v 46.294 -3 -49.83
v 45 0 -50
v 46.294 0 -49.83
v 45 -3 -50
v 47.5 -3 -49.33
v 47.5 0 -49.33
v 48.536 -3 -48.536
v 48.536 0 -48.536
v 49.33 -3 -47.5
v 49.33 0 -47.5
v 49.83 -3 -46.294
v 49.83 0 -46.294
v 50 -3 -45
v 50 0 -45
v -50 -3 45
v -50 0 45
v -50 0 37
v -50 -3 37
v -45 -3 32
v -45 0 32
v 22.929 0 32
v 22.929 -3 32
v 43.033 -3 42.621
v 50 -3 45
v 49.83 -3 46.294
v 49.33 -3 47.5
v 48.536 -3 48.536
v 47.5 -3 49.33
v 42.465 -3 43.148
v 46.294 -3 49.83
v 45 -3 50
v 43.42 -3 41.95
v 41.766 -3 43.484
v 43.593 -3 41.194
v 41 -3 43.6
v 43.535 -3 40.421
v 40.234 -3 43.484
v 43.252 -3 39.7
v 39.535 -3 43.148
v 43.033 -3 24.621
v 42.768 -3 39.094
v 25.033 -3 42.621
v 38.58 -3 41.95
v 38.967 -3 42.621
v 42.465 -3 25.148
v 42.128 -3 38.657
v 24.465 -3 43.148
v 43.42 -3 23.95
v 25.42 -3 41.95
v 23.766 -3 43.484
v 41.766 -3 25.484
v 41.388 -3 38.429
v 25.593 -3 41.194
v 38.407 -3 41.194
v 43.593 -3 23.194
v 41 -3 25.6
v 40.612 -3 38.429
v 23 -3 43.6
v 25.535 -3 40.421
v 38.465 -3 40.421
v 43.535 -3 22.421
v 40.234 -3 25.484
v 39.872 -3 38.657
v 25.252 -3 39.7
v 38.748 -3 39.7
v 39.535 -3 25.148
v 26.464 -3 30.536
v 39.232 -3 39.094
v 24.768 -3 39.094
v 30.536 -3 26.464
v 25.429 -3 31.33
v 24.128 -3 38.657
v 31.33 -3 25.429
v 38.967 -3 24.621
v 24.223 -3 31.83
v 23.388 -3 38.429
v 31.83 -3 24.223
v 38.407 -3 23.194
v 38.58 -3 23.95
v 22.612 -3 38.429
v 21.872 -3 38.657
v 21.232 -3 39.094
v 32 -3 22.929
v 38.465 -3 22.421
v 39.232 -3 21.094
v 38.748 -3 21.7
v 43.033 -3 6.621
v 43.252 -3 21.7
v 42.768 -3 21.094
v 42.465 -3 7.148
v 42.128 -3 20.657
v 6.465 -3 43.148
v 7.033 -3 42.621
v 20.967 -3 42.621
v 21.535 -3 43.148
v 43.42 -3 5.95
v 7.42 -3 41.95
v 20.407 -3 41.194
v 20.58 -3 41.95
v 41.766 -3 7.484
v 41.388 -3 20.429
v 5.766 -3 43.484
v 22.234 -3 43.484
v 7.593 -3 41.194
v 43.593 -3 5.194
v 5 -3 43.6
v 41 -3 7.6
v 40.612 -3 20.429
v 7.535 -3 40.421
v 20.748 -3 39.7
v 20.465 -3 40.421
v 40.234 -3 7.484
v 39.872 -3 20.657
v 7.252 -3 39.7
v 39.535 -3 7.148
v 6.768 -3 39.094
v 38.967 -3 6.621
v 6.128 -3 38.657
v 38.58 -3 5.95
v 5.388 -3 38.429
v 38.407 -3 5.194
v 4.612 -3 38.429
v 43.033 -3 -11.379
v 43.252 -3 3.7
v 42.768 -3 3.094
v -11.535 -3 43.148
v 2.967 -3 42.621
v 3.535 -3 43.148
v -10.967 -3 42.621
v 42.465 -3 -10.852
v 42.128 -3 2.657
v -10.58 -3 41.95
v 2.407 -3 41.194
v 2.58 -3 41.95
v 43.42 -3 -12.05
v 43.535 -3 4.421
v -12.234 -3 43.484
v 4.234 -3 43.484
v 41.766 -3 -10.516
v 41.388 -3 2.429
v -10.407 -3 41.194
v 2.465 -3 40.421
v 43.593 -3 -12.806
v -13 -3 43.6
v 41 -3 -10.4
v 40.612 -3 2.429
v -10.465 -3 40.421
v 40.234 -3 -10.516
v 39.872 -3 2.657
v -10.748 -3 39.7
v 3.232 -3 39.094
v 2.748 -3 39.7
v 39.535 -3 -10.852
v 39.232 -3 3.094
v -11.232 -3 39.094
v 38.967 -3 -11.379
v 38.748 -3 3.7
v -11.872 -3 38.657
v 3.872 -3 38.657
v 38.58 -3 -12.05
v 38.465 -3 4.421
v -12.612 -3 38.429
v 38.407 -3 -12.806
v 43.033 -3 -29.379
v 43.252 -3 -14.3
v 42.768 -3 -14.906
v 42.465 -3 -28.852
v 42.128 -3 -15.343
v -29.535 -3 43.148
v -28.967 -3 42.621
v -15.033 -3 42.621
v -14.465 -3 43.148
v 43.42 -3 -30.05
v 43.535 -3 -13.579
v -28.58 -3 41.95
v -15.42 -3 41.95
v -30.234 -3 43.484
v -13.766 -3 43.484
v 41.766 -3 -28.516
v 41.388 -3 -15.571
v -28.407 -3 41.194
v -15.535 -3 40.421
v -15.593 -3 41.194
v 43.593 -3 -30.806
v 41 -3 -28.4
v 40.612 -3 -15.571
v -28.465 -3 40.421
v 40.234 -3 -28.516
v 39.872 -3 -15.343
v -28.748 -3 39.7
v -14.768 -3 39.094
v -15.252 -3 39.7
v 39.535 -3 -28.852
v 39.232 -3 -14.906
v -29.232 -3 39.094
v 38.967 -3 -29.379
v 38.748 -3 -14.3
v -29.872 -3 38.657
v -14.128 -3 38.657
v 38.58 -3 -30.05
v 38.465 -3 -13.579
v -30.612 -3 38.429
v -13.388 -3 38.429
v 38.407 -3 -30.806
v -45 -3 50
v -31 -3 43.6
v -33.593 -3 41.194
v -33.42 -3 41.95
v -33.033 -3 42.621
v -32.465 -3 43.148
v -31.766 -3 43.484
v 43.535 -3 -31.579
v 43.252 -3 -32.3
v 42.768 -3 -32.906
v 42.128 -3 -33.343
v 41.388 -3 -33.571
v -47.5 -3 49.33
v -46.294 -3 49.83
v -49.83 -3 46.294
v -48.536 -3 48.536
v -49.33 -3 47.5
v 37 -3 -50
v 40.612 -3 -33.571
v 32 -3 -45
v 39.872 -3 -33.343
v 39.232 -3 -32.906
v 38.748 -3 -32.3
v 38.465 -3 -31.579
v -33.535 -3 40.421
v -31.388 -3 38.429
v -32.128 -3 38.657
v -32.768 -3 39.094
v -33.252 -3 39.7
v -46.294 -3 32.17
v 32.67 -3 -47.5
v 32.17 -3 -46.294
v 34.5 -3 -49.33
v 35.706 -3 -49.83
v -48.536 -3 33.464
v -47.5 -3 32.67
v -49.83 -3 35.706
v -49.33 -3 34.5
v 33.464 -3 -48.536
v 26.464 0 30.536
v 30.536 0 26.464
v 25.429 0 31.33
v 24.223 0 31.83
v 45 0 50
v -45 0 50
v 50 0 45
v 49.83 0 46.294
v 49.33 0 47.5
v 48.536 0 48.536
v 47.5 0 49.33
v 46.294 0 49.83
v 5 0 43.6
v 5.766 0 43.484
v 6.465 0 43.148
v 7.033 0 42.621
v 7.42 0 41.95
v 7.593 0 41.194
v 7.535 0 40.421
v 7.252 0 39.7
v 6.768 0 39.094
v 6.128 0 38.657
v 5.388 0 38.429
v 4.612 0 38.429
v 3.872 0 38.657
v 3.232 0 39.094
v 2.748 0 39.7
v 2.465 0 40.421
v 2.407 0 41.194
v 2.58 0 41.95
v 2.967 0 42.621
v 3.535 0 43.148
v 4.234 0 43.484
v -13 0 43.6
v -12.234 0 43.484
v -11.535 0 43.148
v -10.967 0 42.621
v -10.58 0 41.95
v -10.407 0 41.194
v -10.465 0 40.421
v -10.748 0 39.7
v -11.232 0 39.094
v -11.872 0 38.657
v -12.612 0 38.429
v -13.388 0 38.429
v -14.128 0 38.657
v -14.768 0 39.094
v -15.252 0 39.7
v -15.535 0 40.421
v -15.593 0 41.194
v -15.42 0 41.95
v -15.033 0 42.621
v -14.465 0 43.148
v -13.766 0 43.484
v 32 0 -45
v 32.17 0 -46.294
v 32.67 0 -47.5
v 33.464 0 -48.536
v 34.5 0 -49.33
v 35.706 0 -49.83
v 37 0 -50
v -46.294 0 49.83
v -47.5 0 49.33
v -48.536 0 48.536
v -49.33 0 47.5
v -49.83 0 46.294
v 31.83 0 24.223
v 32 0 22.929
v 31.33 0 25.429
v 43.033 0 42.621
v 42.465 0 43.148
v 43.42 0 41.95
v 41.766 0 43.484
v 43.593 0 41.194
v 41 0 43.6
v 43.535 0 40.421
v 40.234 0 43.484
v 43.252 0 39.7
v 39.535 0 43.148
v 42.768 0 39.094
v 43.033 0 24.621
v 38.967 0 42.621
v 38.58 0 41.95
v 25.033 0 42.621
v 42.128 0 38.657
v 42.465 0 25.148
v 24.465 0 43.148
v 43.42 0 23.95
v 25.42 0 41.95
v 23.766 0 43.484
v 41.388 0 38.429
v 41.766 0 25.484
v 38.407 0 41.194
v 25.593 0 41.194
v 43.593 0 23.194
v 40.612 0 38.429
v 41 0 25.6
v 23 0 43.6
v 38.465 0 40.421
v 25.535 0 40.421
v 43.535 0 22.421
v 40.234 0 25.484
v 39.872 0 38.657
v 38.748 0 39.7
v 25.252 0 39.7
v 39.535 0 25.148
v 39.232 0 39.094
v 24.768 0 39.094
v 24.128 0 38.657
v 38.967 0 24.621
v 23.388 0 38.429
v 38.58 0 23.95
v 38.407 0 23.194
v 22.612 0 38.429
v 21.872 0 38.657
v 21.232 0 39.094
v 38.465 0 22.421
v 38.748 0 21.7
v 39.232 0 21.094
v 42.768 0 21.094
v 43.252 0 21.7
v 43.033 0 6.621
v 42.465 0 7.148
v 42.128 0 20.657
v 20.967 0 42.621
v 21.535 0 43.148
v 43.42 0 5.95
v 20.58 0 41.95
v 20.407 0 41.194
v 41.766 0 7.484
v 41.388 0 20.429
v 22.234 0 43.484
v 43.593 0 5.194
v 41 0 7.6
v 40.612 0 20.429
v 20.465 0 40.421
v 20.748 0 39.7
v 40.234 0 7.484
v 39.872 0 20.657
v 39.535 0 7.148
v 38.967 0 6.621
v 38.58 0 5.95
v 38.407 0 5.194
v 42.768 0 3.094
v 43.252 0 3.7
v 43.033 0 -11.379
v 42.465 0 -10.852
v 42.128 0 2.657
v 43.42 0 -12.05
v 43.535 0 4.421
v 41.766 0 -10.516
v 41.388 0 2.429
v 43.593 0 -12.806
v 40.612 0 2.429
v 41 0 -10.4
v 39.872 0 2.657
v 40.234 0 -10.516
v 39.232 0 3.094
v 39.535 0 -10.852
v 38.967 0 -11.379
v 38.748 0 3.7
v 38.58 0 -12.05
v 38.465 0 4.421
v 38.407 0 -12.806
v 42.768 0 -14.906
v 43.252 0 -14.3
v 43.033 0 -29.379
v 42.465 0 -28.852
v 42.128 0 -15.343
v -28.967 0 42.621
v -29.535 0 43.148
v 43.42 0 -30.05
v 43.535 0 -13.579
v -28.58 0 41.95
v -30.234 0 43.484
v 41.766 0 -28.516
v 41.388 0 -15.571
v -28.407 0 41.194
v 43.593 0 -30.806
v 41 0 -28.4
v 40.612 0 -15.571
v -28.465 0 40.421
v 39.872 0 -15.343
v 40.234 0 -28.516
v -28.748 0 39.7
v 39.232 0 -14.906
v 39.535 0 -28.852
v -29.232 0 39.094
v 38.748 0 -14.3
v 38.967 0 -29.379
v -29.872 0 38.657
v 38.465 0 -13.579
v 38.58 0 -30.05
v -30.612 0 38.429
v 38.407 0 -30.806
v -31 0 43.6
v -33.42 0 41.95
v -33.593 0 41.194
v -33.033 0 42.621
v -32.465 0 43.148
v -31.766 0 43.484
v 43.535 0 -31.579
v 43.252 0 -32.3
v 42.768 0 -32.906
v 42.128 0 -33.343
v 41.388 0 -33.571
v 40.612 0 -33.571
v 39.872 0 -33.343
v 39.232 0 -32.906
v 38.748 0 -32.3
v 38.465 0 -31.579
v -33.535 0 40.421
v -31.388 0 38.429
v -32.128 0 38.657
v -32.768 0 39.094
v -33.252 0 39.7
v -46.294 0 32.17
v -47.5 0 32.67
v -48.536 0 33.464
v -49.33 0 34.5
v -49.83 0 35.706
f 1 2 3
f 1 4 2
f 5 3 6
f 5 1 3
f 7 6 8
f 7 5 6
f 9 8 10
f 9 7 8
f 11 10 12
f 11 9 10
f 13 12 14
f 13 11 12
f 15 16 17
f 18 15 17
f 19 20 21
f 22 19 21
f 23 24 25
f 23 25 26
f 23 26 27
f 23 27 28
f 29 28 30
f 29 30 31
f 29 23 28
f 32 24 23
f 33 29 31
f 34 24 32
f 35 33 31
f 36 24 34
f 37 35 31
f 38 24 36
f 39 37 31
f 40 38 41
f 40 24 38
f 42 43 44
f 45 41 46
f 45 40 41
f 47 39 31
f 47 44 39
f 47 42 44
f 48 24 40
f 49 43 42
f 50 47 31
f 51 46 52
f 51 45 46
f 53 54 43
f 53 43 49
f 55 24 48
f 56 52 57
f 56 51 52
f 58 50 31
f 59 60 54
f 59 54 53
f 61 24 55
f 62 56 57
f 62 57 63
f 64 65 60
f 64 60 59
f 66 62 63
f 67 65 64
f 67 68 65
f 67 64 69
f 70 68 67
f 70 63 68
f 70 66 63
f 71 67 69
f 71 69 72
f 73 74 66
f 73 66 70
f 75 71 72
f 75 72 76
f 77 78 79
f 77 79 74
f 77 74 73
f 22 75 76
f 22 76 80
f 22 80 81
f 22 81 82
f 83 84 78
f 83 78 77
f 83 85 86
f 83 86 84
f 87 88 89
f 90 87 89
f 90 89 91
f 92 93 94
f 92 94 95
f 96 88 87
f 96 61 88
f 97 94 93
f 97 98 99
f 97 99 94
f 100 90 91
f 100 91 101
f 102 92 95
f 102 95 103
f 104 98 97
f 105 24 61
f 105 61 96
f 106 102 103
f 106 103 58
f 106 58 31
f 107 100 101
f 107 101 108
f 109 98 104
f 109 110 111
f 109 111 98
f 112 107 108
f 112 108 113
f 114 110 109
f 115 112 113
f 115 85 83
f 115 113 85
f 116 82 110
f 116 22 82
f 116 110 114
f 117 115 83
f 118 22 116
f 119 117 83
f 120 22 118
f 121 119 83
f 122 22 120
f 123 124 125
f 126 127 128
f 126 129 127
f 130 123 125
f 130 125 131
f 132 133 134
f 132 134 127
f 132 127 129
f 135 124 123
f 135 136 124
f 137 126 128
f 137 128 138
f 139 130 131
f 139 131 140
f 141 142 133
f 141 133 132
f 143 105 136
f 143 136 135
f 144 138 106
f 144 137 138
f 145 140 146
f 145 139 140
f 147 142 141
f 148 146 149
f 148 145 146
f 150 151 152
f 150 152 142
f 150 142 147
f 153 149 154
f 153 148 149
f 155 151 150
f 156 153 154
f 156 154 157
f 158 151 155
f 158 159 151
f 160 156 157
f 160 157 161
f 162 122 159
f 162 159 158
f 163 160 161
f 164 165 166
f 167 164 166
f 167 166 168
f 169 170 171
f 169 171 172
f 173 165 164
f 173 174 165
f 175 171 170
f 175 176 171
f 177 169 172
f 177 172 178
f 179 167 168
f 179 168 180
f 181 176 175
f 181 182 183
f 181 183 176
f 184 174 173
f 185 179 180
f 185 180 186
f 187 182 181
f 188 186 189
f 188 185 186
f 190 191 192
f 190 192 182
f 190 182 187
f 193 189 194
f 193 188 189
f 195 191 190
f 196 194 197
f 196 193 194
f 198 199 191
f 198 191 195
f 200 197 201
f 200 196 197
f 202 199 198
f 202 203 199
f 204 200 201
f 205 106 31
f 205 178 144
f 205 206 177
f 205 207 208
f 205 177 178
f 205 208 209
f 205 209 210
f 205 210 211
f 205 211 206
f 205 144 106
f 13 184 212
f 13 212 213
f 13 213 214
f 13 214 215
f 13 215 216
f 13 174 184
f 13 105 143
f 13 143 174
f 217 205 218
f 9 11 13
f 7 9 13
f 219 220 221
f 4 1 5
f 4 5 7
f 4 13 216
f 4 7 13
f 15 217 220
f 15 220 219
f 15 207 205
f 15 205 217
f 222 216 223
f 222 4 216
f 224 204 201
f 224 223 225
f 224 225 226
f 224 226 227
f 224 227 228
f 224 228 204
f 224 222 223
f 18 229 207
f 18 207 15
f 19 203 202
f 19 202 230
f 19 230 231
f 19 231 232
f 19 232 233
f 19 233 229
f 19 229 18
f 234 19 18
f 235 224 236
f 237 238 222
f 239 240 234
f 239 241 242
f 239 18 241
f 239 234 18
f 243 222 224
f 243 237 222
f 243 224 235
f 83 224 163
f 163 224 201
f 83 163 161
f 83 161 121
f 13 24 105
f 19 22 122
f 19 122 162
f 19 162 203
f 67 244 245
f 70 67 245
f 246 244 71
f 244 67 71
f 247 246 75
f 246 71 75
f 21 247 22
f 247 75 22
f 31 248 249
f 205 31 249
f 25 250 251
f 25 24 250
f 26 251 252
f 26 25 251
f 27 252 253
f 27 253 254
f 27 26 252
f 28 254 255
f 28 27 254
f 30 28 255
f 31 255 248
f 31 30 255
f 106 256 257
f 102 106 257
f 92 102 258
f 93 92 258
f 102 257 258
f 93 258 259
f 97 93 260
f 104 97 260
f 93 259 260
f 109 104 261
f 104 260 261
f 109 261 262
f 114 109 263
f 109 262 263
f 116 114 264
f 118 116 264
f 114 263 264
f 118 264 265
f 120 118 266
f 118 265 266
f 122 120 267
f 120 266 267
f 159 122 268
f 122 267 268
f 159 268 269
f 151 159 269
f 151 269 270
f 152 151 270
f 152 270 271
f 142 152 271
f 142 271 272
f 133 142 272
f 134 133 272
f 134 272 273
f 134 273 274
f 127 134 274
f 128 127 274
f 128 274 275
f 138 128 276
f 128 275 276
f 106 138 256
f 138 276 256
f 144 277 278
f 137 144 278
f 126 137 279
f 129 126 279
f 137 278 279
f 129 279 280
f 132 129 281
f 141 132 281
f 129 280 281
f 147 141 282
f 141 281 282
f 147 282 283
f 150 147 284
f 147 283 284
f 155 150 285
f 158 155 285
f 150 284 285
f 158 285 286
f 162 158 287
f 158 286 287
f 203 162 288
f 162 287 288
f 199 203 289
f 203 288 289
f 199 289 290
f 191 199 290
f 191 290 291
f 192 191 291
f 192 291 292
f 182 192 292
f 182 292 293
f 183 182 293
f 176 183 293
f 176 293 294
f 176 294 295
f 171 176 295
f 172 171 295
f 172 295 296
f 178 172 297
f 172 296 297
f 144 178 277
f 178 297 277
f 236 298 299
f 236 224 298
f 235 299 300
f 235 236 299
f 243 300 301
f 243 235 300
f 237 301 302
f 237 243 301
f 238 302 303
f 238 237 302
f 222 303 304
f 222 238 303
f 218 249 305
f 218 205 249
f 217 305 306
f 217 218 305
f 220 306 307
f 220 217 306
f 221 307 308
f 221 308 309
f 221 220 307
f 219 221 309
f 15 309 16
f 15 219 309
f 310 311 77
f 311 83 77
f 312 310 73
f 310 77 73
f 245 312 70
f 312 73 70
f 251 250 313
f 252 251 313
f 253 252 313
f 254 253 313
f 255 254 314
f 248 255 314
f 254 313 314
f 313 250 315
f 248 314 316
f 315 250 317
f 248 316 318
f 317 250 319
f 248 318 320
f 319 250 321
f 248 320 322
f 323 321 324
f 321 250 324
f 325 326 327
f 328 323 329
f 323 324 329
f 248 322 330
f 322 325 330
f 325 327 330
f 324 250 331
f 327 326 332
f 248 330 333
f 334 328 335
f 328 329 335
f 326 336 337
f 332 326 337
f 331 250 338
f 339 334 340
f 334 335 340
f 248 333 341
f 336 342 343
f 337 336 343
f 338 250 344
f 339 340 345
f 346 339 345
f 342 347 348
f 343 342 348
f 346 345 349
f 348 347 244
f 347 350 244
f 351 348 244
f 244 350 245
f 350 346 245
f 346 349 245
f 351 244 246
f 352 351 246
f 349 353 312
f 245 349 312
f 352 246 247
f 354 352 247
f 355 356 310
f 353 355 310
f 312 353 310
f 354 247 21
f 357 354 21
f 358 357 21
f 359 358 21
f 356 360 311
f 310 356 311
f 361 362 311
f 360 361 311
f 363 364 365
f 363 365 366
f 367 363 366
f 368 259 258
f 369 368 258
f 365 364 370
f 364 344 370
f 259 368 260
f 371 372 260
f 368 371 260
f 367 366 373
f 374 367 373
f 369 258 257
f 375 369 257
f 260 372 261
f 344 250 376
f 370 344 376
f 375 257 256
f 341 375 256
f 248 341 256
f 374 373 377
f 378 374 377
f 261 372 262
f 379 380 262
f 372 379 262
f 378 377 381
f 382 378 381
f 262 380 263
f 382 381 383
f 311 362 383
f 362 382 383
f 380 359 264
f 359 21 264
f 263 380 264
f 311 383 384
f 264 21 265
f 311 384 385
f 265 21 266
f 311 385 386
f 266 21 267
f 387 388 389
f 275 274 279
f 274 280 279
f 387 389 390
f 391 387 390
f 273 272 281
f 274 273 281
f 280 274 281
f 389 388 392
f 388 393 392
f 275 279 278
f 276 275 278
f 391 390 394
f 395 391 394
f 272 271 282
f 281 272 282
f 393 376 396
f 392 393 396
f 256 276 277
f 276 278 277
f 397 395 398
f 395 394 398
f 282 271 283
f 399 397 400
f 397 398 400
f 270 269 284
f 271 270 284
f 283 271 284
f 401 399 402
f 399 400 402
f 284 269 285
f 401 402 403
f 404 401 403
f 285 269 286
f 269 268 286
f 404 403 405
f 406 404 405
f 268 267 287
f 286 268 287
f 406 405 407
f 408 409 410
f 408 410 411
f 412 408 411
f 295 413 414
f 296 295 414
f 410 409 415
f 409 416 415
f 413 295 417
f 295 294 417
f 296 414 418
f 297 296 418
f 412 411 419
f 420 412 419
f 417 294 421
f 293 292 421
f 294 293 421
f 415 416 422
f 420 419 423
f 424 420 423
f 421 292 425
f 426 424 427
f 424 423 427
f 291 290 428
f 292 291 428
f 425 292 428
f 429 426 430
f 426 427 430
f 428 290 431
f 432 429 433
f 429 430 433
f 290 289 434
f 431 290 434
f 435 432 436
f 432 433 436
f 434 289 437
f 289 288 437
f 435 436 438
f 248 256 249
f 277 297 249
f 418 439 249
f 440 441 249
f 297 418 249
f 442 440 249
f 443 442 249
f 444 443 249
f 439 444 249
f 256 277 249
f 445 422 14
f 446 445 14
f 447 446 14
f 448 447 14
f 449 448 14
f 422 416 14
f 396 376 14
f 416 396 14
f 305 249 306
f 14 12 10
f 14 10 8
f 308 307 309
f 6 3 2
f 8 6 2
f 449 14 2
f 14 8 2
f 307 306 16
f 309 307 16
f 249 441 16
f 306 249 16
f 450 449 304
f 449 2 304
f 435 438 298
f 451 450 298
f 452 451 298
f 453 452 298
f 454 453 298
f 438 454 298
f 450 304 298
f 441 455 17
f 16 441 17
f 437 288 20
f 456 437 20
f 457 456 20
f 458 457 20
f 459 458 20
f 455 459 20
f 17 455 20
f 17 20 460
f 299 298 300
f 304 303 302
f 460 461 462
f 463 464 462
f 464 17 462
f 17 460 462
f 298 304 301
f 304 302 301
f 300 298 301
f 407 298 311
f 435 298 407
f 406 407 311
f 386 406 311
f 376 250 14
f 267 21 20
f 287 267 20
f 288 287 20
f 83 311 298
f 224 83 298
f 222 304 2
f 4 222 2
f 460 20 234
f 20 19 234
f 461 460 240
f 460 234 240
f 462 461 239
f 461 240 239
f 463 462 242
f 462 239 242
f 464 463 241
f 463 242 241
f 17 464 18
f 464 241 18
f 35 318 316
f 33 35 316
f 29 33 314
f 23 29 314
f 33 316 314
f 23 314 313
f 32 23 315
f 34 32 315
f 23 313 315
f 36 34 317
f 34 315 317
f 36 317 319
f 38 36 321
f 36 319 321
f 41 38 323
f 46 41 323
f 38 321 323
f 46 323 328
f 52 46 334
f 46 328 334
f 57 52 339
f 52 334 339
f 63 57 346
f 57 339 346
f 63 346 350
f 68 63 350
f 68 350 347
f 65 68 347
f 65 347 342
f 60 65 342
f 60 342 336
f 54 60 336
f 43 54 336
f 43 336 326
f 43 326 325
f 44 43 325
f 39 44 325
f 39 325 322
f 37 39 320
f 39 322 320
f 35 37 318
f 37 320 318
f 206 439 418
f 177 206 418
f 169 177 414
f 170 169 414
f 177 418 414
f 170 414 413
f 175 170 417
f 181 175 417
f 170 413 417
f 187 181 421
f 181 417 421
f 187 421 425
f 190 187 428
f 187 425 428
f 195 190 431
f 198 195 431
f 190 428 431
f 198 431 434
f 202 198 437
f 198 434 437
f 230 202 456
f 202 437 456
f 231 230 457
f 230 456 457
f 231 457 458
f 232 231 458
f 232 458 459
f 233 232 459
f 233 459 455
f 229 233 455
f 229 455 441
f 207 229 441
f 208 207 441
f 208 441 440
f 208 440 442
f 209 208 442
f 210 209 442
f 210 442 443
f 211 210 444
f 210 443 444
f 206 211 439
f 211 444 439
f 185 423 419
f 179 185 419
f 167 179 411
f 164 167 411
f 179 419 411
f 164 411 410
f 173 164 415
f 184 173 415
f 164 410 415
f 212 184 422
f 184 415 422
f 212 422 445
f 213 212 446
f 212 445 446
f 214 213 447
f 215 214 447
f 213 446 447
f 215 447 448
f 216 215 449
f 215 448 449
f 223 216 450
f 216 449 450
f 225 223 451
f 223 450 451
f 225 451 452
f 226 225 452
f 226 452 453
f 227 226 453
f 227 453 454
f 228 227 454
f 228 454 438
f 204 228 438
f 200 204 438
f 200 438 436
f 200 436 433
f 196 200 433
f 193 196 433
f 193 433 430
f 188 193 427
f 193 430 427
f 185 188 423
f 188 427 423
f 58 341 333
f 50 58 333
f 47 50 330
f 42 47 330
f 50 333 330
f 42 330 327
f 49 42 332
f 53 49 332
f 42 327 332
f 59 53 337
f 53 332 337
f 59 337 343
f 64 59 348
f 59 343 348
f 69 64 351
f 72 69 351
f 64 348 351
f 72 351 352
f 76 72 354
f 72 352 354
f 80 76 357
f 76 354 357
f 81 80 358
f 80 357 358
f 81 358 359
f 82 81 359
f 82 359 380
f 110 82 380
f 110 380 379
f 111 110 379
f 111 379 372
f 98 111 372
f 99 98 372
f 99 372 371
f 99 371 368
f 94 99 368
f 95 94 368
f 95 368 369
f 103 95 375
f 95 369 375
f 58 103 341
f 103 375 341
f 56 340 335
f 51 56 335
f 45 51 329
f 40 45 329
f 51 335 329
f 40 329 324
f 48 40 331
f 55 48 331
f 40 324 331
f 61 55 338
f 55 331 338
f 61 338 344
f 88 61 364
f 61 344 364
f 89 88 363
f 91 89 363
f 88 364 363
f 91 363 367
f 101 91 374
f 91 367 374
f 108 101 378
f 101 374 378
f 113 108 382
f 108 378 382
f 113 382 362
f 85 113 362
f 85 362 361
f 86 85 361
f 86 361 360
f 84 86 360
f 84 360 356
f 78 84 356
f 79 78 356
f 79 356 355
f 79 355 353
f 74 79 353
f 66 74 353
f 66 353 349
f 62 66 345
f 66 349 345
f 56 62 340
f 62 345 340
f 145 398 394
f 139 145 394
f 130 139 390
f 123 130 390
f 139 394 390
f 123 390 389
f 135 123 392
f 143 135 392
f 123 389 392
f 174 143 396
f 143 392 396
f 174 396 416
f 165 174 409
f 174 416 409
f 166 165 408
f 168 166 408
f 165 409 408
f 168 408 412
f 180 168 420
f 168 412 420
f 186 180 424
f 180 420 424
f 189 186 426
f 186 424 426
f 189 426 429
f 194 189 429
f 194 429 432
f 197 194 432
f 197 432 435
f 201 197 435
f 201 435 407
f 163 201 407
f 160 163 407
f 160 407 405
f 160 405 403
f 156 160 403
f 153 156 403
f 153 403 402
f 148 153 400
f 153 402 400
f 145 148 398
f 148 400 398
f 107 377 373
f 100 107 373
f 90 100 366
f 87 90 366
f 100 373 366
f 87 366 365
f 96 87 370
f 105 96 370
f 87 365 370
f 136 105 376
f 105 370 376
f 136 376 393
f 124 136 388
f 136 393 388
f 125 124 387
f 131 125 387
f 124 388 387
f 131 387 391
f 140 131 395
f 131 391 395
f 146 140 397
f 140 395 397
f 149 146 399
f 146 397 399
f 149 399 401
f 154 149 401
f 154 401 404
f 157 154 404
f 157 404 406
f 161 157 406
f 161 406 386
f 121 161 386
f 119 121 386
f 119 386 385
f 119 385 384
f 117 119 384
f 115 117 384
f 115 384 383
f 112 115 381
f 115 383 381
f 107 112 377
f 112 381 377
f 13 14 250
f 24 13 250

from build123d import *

# Parameters (mm, degrees)
SKETCH1_R          = 2.6
BASE_FLANGE1_DEPTH = 3
FILLET1_R          = 5
FILLET2_R          = 5


# Sheet-metal steps are written as plain solids
with BuildPart() as part:
    # Sketch1 → Base-Flange1 (new body)
    with BuildSketch(Plane(origin=(0, 0, 0), x_dir=(1, 0, 0), z_dir=(0, 1, 0))):
        Polygon((32, 50), (50, 50), (50, -50), (-50, -50), (-50, -32), (25, -32), (32, -25), align=None)
        with Locations(Location((41, -41, 0), (0, 0, 270))):
            Circle(SKETCH1_R, mode=Mode.SUBTRACT)
        with Locations(Location((23, -41, 0), (0, 0, 270))):
            Circle(SKETCH1_R, mode=Mode.SUBTRACT)
        with Locations(Location((5, -41, 0), (0, 0, 270))):
            Circle(SKETCH1_R, mode=Mode.SUBTRACT)
        with Locations(Location((-13, -41, 0), (0, 0, 270))):
            Circle(SKETCH1_R, mode=Mode.SUBTRACT)
        with Locations(Location((-31, -41, 0), (0, 0, 270))):
            Circle(SKETCH1_R, mode=Mode.SUBTRACT)
        with Locations(Location((41, -23, 0), (0, 0, 270))):
            Circle(SKETCH1_R, mode=Mode.SUBTRACT)
        with Locations(Location((41, -5, 0), (0, 0, 270))):
            Circle(SKETCH1_R, mode=Mode.SUBTRACT)
        with Locations(Location((41, 13, 0), (0, 0, 270))):
            Circle(SKETCH1_R, mode=Mode.SUBTRACT)
        with Locations(Location((41, 31, 0), (0, 0, 270))):
            Circle(SKETCH1_R, mode=Mode.SUBTRACT)
    extrude(amount=-BASE_FLANGE1_DEPTH)

    # Fillet1
    fillet1_edges = [part.edges().sort_by_distance(p)[0] for p in [
        (25, -1.5, 32),
        (32, -1.5, 25),
    ]]
    fillet(fillet1_edges, radius=FILLET1_R)

    # Fillet2
    fillet2_edges = [part.edges().sort_by_distance(p)[0] for p in [
        (50, -1.5, 50),
        (-50, -1.5, 50),
        (-50, -1.5, 32),
        (32, -1.5, -50),
        (50, -1.5, -50),
    ]]
    fillet(fillet2_edges, radius=FILLET2_R)


solid = part.part
